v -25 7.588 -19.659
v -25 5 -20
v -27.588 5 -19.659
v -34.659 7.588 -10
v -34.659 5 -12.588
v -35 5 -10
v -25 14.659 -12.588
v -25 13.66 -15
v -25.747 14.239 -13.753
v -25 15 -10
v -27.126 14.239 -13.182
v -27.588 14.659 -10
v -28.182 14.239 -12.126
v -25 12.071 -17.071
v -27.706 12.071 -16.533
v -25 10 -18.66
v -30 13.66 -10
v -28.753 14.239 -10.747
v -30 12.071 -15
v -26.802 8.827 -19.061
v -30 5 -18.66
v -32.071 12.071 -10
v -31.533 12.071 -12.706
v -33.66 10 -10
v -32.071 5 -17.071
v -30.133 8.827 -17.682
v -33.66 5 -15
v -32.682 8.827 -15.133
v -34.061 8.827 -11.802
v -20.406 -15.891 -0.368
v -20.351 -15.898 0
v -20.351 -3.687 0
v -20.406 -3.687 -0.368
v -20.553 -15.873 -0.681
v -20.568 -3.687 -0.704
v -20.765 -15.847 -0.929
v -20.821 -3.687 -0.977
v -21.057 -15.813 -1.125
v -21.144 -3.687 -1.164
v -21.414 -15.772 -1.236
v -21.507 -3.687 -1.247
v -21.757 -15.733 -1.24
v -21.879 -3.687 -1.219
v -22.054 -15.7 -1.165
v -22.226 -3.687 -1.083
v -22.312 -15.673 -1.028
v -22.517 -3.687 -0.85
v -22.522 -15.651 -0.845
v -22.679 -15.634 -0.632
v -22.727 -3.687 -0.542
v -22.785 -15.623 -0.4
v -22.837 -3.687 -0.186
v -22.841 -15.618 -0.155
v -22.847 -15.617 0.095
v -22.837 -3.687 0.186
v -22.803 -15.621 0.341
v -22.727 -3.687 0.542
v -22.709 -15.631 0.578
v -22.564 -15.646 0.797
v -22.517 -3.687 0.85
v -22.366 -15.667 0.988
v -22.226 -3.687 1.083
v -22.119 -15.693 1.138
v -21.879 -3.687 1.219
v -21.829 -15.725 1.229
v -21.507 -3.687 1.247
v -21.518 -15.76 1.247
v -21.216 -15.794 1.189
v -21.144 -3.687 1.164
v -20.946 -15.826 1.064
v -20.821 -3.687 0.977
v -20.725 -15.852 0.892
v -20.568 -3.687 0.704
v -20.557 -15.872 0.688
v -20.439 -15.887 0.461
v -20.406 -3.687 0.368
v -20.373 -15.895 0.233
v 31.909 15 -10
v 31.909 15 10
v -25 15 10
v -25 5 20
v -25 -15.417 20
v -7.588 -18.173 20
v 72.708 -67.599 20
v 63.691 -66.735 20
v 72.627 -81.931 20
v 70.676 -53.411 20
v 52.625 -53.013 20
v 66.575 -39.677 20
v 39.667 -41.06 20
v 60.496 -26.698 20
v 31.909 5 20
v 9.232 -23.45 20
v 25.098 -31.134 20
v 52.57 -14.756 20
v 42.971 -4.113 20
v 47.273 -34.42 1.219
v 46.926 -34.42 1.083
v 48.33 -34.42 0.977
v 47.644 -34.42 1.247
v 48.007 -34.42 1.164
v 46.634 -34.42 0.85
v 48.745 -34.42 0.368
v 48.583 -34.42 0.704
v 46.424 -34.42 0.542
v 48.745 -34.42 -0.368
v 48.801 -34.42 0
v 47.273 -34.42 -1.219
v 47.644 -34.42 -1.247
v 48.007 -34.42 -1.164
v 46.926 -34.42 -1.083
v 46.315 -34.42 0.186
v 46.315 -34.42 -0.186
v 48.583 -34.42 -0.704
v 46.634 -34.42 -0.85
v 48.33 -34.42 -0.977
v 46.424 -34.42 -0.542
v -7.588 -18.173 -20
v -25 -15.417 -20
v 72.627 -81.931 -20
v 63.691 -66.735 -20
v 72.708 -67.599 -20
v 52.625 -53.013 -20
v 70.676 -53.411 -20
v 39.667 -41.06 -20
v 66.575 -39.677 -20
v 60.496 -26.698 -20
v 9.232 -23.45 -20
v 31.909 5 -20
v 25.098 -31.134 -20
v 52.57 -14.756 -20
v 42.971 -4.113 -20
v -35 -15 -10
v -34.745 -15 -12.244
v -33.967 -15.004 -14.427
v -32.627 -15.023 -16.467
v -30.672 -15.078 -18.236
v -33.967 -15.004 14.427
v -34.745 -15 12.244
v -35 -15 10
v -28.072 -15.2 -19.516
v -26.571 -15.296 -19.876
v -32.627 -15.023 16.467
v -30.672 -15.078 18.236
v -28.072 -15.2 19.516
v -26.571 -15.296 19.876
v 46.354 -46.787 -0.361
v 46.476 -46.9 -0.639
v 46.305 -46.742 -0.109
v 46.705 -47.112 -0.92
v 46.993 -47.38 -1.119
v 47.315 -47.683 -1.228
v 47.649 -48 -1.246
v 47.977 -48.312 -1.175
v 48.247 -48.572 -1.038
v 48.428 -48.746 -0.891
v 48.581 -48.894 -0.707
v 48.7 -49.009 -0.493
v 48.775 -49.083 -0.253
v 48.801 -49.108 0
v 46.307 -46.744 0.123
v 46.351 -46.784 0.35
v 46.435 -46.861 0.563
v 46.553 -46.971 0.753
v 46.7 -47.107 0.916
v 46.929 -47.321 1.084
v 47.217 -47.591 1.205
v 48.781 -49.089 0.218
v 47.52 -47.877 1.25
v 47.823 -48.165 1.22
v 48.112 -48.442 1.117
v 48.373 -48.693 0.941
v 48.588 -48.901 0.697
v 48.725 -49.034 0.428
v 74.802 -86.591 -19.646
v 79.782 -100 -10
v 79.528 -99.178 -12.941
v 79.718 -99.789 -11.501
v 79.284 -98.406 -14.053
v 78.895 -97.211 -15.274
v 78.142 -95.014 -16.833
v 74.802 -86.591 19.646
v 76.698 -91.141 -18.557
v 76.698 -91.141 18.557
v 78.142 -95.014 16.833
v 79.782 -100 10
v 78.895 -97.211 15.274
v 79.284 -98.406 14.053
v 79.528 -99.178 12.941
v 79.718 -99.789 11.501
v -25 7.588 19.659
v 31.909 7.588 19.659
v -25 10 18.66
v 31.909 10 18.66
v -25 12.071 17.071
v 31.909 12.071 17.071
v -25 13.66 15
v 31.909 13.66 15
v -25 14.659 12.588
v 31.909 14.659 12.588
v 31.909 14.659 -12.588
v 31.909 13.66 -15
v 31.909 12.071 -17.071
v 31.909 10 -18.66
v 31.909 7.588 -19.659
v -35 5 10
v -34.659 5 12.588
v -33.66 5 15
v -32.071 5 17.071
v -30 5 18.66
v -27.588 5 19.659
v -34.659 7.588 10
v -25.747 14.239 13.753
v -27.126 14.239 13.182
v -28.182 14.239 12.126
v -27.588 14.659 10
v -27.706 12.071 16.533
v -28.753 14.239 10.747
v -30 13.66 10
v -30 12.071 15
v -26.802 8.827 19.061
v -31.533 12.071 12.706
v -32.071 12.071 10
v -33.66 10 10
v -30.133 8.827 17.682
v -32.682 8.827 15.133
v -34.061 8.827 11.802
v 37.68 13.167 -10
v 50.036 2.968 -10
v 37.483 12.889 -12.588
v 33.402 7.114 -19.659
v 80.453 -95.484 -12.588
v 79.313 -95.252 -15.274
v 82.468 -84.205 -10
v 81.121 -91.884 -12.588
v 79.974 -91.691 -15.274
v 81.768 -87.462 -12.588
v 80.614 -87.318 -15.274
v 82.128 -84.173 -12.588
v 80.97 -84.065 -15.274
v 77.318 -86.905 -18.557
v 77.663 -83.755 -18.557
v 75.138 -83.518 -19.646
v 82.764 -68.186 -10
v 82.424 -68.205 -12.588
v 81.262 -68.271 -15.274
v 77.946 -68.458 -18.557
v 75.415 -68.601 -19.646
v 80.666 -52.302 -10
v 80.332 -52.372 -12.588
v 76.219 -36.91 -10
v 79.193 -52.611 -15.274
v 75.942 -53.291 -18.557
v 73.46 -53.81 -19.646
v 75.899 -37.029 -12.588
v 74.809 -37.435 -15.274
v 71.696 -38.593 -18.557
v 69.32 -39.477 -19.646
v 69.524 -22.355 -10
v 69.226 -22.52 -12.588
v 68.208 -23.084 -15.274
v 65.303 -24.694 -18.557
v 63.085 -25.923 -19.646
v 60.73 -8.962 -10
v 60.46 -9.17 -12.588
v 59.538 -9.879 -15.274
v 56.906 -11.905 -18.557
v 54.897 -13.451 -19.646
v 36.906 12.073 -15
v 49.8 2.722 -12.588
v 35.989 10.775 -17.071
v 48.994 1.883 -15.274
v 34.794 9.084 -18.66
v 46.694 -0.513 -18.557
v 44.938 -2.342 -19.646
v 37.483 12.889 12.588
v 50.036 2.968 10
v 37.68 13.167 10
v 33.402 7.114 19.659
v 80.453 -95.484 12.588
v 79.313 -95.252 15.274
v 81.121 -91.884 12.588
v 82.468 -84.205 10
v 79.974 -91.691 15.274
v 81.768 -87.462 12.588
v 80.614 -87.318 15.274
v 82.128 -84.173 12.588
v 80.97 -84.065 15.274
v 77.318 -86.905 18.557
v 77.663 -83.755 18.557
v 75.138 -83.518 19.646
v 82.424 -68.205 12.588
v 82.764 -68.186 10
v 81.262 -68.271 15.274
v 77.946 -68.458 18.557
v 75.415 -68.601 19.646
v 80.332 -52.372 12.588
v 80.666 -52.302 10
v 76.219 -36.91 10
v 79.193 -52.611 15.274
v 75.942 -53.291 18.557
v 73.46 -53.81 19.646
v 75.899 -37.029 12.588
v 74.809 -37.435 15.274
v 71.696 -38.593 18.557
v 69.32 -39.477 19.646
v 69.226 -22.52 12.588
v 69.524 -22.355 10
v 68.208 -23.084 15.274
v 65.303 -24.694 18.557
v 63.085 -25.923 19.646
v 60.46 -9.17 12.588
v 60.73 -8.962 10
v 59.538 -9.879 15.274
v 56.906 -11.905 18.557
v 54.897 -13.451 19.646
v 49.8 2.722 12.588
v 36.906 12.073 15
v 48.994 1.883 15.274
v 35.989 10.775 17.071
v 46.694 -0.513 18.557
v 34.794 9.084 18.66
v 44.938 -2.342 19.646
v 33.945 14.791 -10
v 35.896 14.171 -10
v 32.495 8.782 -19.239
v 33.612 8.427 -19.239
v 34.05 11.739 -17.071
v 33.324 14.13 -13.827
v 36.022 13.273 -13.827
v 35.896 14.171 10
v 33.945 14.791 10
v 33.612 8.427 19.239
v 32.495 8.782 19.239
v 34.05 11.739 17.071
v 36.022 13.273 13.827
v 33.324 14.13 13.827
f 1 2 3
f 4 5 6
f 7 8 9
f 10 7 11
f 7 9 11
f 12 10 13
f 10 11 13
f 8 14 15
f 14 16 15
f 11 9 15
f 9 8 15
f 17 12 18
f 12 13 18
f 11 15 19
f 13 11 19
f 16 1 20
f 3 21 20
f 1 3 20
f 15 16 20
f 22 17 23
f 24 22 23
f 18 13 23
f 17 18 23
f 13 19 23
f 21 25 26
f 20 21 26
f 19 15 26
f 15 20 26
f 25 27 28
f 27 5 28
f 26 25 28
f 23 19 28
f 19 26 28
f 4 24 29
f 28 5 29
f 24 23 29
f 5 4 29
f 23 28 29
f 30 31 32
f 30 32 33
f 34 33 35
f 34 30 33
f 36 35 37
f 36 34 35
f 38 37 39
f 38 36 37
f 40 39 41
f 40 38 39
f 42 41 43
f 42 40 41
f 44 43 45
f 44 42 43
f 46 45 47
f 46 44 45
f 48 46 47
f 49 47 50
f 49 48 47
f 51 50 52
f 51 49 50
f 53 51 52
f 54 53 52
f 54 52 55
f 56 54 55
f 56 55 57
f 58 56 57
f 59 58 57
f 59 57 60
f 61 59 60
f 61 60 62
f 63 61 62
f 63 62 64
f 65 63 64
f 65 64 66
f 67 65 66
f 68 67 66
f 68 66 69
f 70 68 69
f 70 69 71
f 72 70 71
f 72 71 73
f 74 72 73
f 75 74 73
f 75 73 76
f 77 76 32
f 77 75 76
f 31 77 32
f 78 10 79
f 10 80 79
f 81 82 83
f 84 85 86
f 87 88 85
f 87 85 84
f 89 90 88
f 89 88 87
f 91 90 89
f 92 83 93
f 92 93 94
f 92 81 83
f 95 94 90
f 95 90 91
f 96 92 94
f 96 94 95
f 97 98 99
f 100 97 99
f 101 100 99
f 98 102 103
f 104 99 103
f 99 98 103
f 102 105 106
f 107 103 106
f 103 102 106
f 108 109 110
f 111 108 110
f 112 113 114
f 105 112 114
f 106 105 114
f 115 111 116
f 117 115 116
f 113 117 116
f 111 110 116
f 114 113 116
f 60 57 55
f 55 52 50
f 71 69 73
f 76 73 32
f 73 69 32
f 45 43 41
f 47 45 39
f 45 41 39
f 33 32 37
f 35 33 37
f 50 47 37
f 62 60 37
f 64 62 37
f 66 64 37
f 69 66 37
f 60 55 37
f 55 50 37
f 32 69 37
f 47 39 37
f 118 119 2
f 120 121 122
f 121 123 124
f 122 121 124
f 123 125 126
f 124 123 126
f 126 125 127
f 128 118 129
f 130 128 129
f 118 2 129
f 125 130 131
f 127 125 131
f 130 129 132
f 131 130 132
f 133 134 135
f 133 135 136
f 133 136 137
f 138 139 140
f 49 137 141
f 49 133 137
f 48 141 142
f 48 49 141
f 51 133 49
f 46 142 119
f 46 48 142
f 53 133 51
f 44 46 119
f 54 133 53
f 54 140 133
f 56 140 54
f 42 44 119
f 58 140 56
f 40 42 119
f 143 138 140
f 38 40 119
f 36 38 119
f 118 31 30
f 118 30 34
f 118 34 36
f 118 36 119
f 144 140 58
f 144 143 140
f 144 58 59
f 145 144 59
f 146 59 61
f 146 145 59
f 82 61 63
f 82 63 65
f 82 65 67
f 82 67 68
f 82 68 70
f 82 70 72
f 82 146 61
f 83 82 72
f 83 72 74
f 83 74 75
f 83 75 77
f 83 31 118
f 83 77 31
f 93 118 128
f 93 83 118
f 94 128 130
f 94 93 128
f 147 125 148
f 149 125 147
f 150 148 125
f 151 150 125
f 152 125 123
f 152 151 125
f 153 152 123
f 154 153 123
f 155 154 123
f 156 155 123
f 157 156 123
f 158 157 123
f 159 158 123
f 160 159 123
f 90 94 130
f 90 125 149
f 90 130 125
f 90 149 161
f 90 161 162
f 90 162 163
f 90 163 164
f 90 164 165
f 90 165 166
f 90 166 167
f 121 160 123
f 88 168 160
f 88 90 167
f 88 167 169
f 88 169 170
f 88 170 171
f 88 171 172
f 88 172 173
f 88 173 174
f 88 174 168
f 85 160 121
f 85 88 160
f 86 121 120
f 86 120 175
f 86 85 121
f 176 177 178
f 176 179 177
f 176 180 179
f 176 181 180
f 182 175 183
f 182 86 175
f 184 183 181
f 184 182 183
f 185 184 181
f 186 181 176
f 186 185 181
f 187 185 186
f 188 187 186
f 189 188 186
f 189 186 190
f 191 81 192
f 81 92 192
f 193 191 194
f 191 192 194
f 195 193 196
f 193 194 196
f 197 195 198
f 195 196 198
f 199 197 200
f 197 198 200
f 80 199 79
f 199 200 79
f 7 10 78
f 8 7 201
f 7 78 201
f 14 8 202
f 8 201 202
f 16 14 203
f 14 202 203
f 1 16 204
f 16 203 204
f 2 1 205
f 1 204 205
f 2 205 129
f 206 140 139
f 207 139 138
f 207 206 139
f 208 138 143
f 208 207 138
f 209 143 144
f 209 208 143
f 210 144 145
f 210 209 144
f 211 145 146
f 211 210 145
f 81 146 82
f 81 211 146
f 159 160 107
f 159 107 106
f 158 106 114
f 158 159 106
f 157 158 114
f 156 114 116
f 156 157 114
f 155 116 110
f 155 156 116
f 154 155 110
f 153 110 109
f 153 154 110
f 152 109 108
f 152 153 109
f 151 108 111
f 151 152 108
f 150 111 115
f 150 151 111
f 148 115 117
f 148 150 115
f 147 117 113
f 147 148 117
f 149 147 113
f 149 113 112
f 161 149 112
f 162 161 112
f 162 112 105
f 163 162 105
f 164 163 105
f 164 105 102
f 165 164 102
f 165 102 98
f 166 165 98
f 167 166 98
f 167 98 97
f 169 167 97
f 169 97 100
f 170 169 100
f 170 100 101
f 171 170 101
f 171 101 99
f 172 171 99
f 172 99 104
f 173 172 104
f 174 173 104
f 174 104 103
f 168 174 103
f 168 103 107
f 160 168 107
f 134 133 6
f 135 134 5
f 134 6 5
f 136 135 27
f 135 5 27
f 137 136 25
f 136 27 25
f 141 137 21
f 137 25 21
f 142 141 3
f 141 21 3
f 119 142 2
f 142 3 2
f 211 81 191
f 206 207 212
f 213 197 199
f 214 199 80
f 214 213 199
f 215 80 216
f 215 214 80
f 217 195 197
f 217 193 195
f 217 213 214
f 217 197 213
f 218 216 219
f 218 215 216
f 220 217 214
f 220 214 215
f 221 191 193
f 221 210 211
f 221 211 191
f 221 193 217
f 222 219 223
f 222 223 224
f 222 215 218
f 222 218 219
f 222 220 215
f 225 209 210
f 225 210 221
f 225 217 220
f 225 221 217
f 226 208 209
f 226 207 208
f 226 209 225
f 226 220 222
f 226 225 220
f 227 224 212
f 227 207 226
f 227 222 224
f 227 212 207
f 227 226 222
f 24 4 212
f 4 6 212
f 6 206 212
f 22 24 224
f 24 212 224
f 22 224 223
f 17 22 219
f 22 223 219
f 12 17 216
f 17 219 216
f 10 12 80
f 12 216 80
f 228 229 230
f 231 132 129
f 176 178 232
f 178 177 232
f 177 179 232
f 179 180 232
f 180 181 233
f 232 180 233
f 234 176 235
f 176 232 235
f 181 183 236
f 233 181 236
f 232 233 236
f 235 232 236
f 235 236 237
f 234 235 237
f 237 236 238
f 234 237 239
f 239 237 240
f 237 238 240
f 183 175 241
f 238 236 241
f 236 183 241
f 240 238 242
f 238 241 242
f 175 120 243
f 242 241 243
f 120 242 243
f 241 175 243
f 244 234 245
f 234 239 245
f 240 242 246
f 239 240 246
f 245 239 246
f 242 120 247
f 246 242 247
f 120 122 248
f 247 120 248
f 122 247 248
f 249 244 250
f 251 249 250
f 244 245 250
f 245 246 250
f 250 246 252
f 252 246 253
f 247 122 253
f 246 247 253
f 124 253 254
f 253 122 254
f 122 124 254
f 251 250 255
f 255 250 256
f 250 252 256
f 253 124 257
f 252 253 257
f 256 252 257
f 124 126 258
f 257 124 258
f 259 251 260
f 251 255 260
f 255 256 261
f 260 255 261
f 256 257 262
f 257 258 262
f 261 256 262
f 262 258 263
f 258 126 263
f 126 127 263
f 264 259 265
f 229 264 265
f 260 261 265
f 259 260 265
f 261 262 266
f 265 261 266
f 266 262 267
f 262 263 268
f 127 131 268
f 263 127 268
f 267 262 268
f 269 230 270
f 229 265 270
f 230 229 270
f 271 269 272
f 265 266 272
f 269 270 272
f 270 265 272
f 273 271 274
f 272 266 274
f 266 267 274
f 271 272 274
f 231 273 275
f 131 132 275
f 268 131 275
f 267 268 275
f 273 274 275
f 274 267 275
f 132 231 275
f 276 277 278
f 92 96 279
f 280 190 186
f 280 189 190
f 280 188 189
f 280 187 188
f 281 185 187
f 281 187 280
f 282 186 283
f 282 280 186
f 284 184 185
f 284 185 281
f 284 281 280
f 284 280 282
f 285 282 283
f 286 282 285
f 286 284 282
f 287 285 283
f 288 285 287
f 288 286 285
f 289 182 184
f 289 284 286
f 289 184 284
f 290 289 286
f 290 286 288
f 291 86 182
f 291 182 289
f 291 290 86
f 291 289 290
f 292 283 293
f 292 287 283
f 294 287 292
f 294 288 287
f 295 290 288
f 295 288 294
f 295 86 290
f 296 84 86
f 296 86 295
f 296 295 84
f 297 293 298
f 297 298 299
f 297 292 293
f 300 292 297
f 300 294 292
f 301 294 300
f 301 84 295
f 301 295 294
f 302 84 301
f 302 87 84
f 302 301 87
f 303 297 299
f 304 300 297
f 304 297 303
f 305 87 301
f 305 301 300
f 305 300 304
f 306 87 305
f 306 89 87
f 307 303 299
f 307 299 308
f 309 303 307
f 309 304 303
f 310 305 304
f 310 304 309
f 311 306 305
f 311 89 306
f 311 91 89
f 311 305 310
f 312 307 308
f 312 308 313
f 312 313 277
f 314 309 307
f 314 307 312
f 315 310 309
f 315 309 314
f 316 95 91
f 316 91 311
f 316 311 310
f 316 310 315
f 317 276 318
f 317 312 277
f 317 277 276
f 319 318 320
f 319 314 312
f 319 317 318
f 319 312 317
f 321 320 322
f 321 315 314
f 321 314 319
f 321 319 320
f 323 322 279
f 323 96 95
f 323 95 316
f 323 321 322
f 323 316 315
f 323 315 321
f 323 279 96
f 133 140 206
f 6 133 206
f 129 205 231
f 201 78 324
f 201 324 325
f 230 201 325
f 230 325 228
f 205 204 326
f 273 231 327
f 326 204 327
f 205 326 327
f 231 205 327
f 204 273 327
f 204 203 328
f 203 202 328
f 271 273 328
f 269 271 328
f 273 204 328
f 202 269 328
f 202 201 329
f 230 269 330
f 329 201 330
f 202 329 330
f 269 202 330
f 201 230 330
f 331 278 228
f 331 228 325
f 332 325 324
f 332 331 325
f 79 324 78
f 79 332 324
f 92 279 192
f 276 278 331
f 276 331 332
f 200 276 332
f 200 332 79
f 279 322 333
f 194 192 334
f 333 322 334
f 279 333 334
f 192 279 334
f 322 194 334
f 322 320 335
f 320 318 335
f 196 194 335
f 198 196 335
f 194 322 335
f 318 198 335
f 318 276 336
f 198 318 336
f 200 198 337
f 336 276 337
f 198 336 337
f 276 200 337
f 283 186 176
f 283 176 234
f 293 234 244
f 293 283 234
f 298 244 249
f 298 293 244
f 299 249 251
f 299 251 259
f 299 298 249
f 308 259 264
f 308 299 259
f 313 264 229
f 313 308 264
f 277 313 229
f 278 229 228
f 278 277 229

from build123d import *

# Parameters (mm, degrees)
ESQUISSE1_W             = 70
ESQUISSE1_H             = 30
BOSS_EXTRU_1_DEPTH      = 20
CONG_7_R                = 10
ESQUISSE12_R            = 1.25
ENL_V_MAT_EXTRU_5_DEPTH = 15
ESQUISSE11_R            = 1.25
ENL_V_MAT_EXTRU_6_DEPTH = 20


with BuildPart() as part:
    # Esquisse1 → Boss.-Extru.1 (new body, symmetric)
    with BuildSketch(Plane.XY):
        with BuildLine():
            ThreePointArc((79.782402832, -100), (75.641274878, -35.393198769), (35, 15))
            Line((35, 15), (35, -15))
            Line((35, -15), (-35, -15))
            ThreePointArc((-35, -15), (36.414284285, -38.56349239), (79.782402832, -100))
        make_face()
        Rectangle(ESQUISSE1_W, ESQUISSE1_H)
    extrude(amount=BOSS_EXTRU_1_DEPTH, both=True)

    # Congé7
    cong_7_edges = [part.edges().sort_by_distance(p)[0] for p in [
        (-35, 0, 20),
        (75.641274878, -35.393198769, 20),
        (-35, 0, -20),
        (0, 15, -20),
        (75.641274878, -35.393198769, -20),
        (0, 15, 20),
        (-35, 15, 0),
        (35, 15, 0),
    ]]
    fillet(cong_7_edges, radius=CONG_7_R)

    # Esquisse12 → Enlèv. mat.-Extru.5 (cut)
    with BuildSketch(Plane(origin=(0, -18.687162838, 0), x_dir=(1, 0, 0), z_dir=(0, 1, 0))):
        with Locations((-21.600806316, 0)):
            Circle(ESQUISSE12_R)
    extrude(amount=ENL_V_MAT_EXTRU_5_DEPTH, mode=Mode.SUBTRACT)

    # Esquisse11 → Enlèv. mat.-Extru.6 (cut)
    with BuildSketch(Plane(origin=(0, -54.41956978, 0), x_dir=(1, 0, 0), z_dir=(0, 1, 0))):
        with Locations((47.550679202, 0)):
            Circle(ESQUISSE11_R)
    extrude(amount=ENL_V_MAT_EXTRU_6_DEPTH, mode=Mode.SUBTRACT)


solid = part.part
